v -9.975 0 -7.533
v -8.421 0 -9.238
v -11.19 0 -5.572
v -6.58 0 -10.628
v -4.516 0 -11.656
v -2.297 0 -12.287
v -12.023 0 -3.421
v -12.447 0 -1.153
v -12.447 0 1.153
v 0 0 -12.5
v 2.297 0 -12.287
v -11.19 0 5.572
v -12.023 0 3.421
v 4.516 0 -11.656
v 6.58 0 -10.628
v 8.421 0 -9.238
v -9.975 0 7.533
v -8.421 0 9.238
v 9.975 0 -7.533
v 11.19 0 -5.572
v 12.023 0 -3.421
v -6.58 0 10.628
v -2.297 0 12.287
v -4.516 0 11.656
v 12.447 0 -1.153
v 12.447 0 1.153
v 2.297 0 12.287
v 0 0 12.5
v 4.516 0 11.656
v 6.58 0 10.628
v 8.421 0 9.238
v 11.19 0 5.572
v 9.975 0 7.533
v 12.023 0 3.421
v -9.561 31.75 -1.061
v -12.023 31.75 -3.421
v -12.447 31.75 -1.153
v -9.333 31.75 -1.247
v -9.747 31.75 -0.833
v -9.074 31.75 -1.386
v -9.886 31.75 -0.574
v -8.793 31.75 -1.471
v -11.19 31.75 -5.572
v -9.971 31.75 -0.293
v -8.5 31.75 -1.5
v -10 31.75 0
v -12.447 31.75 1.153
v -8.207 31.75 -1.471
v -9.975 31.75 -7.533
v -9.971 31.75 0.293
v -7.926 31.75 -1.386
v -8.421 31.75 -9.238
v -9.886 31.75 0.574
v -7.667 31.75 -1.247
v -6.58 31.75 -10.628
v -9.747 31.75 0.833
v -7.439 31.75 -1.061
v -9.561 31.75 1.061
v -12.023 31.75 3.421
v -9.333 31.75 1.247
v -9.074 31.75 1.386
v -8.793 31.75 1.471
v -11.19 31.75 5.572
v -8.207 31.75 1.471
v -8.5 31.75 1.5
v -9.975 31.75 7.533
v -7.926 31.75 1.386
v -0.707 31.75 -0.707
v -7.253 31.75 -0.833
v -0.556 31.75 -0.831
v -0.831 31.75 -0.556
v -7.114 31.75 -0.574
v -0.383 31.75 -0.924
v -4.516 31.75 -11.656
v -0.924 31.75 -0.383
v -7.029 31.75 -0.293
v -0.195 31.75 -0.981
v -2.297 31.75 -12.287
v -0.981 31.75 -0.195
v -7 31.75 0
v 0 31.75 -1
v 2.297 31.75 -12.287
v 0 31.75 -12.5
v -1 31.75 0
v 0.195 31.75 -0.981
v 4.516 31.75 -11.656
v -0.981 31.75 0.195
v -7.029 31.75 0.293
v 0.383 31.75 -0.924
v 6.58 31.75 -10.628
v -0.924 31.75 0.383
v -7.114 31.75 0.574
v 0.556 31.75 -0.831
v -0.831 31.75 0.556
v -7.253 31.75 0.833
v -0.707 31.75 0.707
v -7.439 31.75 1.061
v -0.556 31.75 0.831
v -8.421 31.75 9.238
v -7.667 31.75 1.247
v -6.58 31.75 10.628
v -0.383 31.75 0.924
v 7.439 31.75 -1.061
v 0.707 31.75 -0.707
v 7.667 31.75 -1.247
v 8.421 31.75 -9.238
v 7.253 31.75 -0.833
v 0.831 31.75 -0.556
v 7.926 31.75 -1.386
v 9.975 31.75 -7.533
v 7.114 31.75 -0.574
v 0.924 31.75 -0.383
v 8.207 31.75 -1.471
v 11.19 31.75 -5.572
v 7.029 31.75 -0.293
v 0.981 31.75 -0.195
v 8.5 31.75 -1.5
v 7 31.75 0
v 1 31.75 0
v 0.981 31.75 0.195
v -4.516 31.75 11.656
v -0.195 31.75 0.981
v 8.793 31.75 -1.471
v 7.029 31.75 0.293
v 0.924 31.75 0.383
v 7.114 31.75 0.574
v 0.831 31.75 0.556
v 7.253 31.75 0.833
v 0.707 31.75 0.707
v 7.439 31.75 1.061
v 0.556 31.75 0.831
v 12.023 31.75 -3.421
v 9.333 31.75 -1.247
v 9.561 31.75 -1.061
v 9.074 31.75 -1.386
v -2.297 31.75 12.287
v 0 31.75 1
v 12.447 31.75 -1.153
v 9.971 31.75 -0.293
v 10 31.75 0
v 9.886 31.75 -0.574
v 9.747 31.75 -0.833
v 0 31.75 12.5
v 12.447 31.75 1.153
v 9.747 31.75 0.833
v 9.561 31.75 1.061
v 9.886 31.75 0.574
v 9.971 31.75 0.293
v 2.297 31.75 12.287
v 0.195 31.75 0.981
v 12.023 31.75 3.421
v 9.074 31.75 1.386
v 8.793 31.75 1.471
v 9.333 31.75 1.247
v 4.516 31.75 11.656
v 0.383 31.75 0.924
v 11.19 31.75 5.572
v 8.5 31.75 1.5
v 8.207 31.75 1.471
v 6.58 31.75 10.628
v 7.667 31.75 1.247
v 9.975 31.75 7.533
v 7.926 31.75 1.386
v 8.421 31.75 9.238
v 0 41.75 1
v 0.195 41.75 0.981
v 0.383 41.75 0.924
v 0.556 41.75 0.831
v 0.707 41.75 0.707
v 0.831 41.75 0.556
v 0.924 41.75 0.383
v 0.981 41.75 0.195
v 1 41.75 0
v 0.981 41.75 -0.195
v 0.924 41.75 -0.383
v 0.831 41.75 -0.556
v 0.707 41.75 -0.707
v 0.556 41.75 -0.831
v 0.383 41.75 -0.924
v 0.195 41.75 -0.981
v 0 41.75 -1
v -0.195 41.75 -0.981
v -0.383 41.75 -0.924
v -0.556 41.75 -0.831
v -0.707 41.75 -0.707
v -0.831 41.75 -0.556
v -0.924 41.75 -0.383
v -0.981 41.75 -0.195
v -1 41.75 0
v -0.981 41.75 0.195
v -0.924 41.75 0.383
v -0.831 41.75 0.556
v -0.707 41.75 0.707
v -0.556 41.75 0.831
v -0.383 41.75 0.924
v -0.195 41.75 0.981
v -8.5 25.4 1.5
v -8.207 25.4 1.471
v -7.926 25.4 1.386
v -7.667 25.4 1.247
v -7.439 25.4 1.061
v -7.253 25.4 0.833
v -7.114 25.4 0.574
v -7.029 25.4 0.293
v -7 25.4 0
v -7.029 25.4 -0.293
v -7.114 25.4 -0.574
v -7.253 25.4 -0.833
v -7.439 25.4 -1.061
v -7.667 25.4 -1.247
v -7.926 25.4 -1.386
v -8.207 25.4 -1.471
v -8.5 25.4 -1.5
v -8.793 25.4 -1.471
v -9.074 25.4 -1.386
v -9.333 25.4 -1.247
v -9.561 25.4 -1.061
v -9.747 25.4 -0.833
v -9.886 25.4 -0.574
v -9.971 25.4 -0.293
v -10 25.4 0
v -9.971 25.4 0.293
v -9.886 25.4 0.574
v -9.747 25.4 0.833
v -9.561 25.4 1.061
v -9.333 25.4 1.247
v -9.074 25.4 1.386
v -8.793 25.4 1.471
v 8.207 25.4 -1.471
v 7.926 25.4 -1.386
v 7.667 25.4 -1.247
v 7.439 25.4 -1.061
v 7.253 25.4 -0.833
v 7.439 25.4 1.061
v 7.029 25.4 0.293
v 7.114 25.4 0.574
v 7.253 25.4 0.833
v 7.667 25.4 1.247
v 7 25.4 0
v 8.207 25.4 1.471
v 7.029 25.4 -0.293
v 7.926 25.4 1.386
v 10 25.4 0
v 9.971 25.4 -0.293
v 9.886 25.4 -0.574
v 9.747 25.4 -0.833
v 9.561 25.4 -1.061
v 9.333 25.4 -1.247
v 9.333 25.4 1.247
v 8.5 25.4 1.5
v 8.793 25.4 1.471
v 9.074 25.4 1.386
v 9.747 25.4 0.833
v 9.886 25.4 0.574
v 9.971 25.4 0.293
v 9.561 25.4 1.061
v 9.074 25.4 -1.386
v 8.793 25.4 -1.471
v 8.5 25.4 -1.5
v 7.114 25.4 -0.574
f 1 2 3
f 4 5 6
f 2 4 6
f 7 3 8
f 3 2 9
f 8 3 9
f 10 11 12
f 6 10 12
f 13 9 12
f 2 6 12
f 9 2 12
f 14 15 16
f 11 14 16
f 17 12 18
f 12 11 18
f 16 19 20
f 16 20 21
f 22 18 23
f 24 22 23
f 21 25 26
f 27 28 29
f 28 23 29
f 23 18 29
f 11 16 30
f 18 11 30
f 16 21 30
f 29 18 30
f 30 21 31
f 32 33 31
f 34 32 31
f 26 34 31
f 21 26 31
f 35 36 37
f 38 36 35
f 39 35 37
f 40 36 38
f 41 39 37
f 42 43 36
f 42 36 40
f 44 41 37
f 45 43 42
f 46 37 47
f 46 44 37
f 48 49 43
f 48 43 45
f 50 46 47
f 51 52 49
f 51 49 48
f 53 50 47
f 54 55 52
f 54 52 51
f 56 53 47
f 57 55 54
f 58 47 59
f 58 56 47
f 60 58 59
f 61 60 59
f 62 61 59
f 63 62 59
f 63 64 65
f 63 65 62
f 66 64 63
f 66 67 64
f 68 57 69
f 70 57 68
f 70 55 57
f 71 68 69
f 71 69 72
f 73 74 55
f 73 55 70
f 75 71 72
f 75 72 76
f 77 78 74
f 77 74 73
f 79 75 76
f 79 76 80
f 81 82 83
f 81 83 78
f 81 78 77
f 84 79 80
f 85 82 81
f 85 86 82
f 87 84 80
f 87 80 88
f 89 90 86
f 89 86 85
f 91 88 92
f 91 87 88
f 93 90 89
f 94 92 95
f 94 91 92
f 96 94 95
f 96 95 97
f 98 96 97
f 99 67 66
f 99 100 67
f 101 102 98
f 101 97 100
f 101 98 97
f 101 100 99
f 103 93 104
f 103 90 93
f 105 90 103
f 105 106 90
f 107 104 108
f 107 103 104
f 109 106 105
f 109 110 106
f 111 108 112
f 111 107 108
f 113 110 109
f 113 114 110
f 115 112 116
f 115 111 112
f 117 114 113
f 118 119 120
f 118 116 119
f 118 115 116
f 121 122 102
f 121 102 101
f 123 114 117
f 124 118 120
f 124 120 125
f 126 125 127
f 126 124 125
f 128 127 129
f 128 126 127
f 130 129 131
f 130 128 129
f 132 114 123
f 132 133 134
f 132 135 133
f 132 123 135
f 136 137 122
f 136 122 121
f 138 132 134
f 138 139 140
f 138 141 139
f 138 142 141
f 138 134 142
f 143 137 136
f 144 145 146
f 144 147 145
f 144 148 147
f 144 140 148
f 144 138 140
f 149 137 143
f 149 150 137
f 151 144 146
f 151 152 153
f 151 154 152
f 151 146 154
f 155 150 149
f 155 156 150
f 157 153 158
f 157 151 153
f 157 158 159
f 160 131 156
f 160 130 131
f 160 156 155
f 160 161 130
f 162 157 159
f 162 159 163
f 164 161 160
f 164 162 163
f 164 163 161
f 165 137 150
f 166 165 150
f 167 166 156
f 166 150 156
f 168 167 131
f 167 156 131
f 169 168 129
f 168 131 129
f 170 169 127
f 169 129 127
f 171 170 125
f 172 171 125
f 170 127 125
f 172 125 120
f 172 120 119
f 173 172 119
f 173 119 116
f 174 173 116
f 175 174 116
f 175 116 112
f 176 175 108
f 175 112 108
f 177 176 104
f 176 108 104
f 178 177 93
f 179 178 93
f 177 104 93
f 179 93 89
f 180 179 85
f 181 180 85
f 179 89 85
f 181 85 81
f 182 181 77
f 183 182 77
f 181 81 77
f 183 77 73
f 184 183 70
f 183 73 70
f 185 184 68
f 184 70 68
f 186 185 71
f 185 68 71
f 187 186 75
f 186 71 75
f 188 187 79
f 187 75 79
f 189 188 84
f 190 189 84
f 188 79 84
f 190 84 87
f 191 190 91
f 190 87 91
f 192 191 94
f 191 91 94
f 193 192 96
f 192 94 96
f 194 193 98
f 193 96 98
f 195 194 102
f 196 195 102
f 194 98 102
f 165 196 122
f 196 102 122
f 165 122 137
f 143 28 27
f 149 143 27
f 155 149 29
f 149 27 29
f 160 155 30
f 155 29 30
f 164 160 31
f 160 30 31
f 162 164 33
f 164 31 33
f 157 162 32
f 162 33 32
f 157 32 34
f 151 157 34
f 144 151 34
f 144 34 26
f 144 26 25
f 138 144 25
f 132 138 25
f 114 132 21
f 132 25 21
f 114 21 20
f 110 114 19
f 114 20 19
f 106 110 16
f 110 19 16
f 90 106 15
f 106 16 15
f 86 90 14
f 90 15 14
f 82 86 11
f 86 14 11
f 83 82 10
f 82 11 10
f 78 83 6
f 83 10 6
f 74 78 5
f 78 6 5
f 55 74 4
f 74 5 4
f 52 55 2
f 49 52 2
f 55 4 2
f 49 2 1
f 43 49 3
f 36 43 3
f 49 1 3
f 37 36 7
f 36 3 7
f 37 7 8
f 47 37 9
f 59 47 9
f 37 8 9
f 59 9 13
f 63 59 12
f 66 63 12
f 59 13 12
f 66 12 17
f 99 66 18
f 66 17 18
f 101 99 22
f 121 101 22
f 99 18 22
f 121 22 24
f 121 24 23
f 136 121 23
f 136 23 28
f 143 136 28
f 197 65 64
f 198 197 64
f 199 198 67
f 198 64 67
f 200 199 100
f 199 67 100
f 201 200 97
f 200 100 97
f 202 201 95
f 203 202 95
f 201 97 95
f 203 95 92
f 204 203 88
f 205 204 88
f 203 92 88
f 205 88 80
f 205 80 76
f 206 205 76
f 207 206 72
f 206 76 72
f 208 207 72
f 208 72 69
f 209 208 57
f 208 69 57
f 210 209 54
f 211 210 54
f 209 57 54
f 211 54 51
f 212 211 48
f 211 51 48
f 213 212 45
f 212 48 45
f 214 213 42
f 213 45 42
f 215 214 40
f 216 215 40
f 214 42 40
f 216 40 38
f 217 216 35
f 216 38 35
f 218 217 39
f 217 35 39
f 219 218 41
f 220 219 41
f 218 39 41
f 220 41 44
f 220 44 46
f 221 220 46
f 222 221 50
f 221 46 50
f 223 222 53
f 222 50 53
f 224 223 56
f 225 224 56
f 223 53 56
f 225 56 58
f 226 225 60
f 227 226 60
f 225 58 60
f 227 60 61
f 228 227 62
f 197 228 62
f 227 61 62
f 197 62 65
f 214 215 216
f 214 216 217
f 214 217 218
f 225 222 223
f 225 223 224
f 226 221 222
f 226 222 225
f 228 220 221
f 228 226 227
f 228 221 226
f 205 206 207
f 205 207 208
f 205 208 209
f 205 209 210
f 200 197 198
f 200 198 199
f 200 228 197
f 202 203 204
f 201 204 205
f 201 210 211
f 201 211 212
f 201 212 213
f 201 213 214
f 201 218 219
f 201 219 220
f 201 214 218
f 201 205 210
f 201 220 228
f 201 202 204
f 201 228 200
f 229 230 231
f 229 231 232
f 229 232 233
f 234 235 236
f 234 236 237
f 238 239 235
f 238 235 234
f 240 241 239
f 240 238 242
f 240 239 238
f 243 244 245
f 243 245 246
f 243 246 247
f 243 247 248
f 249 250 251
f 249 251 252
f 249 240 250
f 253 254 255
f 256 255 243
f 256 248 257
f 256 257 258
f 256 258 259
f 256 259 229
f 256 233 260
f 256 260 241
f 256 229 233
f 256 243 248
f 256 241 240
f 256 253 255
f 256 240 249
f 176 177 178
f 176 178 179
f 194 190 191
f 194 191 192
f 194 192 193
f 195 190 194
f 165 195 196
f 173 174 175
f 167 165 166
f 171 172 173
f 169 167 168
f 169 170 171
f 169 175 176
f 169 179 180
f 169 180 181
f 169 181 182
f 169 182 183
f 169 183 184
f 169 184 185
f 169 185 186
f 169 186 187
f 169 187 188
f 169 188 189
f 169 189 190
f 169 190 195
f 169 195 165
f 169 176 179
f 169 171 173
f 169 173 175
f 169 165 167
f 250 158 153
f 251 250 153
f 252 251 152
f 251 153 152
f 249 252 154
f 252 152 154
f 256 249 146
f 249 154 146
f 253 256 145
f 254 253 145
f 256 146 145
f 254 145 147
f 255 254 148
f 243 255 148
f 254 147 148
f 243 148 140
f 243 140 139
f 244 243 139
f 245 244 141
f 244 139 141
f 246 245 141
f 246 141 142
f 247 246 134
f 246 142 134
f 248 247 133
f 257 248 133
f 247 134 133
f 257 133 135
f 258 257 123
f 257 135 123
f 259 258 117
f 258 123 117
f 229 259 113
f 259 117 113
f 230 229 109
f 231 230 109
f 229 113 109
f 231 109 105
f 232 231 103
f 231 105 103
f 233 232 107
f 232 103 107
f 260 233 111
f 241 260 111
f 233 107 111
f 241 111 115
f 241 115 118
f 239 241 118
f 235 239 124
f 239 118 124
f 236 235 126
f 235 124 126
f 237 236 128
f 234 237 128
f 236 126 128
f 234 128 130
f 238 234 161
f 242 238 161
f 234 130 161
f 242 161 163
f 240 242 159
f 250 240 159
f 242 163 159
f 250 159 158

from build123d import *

# Parameters (mm, degrees)
SKETCH1_R           = 12.5
BOSS_EXTRUDE1_DEPTH = 31.75
SKETCH2_R           = 1
BOSS_EXTRUDE2_DEPTH = 10
SKETCH3_R           = 1.5
CUT_EXTRUDE1_DEPTH  = 6.35


with BuildPart() as part:
    # Sketch1 → Boss-Extrude1 (new body)
    with BuildSketch(Plane(origin=(0, 0, 0), x_dir=(1, 0, 0), z_dir=(0, 1, 0))):
        with Locations(Location((0, 0, 0), (0, 0, 270))):
            Circle(SKETCH1_R)
    extrude(amount=BOSS_EXTRUDE1_DEPTH)

    # Sketch2 → Boss-Extrude2 (add)
    with BuildSketch(Plane(origin=(0, 31.75, 0), x_dir=(1, 0, 0), z_dir=(0, 1, 0))):
        with Locations(Location((0, 0, 0), (0, 0, 270))):
            Circle(SKETCH2_R)
    extrude(amount=BOSS_EXTRUDE2_DEPTH)

    # Sketch3 → Cut-Extrude1 (cut)
    with BuildSketch(Plane(origin=(0, 31.75, 0), x_dir=(1, 0, 0), z_dir=(0, 1, 0))):
        with Locations(Location((-8.5, 0, 0), (0, 0, 270))):
            Circle(SKETCH3_R)
        with Locations(Location((8.5, 0, 0), (0, 0, 270))):
            Circle(SKETCH3_R)
    extrude(amount=-CUT_EXTRUDE1_DEPTH, mode=Mode.SUBTRACT)


solid = part.part
